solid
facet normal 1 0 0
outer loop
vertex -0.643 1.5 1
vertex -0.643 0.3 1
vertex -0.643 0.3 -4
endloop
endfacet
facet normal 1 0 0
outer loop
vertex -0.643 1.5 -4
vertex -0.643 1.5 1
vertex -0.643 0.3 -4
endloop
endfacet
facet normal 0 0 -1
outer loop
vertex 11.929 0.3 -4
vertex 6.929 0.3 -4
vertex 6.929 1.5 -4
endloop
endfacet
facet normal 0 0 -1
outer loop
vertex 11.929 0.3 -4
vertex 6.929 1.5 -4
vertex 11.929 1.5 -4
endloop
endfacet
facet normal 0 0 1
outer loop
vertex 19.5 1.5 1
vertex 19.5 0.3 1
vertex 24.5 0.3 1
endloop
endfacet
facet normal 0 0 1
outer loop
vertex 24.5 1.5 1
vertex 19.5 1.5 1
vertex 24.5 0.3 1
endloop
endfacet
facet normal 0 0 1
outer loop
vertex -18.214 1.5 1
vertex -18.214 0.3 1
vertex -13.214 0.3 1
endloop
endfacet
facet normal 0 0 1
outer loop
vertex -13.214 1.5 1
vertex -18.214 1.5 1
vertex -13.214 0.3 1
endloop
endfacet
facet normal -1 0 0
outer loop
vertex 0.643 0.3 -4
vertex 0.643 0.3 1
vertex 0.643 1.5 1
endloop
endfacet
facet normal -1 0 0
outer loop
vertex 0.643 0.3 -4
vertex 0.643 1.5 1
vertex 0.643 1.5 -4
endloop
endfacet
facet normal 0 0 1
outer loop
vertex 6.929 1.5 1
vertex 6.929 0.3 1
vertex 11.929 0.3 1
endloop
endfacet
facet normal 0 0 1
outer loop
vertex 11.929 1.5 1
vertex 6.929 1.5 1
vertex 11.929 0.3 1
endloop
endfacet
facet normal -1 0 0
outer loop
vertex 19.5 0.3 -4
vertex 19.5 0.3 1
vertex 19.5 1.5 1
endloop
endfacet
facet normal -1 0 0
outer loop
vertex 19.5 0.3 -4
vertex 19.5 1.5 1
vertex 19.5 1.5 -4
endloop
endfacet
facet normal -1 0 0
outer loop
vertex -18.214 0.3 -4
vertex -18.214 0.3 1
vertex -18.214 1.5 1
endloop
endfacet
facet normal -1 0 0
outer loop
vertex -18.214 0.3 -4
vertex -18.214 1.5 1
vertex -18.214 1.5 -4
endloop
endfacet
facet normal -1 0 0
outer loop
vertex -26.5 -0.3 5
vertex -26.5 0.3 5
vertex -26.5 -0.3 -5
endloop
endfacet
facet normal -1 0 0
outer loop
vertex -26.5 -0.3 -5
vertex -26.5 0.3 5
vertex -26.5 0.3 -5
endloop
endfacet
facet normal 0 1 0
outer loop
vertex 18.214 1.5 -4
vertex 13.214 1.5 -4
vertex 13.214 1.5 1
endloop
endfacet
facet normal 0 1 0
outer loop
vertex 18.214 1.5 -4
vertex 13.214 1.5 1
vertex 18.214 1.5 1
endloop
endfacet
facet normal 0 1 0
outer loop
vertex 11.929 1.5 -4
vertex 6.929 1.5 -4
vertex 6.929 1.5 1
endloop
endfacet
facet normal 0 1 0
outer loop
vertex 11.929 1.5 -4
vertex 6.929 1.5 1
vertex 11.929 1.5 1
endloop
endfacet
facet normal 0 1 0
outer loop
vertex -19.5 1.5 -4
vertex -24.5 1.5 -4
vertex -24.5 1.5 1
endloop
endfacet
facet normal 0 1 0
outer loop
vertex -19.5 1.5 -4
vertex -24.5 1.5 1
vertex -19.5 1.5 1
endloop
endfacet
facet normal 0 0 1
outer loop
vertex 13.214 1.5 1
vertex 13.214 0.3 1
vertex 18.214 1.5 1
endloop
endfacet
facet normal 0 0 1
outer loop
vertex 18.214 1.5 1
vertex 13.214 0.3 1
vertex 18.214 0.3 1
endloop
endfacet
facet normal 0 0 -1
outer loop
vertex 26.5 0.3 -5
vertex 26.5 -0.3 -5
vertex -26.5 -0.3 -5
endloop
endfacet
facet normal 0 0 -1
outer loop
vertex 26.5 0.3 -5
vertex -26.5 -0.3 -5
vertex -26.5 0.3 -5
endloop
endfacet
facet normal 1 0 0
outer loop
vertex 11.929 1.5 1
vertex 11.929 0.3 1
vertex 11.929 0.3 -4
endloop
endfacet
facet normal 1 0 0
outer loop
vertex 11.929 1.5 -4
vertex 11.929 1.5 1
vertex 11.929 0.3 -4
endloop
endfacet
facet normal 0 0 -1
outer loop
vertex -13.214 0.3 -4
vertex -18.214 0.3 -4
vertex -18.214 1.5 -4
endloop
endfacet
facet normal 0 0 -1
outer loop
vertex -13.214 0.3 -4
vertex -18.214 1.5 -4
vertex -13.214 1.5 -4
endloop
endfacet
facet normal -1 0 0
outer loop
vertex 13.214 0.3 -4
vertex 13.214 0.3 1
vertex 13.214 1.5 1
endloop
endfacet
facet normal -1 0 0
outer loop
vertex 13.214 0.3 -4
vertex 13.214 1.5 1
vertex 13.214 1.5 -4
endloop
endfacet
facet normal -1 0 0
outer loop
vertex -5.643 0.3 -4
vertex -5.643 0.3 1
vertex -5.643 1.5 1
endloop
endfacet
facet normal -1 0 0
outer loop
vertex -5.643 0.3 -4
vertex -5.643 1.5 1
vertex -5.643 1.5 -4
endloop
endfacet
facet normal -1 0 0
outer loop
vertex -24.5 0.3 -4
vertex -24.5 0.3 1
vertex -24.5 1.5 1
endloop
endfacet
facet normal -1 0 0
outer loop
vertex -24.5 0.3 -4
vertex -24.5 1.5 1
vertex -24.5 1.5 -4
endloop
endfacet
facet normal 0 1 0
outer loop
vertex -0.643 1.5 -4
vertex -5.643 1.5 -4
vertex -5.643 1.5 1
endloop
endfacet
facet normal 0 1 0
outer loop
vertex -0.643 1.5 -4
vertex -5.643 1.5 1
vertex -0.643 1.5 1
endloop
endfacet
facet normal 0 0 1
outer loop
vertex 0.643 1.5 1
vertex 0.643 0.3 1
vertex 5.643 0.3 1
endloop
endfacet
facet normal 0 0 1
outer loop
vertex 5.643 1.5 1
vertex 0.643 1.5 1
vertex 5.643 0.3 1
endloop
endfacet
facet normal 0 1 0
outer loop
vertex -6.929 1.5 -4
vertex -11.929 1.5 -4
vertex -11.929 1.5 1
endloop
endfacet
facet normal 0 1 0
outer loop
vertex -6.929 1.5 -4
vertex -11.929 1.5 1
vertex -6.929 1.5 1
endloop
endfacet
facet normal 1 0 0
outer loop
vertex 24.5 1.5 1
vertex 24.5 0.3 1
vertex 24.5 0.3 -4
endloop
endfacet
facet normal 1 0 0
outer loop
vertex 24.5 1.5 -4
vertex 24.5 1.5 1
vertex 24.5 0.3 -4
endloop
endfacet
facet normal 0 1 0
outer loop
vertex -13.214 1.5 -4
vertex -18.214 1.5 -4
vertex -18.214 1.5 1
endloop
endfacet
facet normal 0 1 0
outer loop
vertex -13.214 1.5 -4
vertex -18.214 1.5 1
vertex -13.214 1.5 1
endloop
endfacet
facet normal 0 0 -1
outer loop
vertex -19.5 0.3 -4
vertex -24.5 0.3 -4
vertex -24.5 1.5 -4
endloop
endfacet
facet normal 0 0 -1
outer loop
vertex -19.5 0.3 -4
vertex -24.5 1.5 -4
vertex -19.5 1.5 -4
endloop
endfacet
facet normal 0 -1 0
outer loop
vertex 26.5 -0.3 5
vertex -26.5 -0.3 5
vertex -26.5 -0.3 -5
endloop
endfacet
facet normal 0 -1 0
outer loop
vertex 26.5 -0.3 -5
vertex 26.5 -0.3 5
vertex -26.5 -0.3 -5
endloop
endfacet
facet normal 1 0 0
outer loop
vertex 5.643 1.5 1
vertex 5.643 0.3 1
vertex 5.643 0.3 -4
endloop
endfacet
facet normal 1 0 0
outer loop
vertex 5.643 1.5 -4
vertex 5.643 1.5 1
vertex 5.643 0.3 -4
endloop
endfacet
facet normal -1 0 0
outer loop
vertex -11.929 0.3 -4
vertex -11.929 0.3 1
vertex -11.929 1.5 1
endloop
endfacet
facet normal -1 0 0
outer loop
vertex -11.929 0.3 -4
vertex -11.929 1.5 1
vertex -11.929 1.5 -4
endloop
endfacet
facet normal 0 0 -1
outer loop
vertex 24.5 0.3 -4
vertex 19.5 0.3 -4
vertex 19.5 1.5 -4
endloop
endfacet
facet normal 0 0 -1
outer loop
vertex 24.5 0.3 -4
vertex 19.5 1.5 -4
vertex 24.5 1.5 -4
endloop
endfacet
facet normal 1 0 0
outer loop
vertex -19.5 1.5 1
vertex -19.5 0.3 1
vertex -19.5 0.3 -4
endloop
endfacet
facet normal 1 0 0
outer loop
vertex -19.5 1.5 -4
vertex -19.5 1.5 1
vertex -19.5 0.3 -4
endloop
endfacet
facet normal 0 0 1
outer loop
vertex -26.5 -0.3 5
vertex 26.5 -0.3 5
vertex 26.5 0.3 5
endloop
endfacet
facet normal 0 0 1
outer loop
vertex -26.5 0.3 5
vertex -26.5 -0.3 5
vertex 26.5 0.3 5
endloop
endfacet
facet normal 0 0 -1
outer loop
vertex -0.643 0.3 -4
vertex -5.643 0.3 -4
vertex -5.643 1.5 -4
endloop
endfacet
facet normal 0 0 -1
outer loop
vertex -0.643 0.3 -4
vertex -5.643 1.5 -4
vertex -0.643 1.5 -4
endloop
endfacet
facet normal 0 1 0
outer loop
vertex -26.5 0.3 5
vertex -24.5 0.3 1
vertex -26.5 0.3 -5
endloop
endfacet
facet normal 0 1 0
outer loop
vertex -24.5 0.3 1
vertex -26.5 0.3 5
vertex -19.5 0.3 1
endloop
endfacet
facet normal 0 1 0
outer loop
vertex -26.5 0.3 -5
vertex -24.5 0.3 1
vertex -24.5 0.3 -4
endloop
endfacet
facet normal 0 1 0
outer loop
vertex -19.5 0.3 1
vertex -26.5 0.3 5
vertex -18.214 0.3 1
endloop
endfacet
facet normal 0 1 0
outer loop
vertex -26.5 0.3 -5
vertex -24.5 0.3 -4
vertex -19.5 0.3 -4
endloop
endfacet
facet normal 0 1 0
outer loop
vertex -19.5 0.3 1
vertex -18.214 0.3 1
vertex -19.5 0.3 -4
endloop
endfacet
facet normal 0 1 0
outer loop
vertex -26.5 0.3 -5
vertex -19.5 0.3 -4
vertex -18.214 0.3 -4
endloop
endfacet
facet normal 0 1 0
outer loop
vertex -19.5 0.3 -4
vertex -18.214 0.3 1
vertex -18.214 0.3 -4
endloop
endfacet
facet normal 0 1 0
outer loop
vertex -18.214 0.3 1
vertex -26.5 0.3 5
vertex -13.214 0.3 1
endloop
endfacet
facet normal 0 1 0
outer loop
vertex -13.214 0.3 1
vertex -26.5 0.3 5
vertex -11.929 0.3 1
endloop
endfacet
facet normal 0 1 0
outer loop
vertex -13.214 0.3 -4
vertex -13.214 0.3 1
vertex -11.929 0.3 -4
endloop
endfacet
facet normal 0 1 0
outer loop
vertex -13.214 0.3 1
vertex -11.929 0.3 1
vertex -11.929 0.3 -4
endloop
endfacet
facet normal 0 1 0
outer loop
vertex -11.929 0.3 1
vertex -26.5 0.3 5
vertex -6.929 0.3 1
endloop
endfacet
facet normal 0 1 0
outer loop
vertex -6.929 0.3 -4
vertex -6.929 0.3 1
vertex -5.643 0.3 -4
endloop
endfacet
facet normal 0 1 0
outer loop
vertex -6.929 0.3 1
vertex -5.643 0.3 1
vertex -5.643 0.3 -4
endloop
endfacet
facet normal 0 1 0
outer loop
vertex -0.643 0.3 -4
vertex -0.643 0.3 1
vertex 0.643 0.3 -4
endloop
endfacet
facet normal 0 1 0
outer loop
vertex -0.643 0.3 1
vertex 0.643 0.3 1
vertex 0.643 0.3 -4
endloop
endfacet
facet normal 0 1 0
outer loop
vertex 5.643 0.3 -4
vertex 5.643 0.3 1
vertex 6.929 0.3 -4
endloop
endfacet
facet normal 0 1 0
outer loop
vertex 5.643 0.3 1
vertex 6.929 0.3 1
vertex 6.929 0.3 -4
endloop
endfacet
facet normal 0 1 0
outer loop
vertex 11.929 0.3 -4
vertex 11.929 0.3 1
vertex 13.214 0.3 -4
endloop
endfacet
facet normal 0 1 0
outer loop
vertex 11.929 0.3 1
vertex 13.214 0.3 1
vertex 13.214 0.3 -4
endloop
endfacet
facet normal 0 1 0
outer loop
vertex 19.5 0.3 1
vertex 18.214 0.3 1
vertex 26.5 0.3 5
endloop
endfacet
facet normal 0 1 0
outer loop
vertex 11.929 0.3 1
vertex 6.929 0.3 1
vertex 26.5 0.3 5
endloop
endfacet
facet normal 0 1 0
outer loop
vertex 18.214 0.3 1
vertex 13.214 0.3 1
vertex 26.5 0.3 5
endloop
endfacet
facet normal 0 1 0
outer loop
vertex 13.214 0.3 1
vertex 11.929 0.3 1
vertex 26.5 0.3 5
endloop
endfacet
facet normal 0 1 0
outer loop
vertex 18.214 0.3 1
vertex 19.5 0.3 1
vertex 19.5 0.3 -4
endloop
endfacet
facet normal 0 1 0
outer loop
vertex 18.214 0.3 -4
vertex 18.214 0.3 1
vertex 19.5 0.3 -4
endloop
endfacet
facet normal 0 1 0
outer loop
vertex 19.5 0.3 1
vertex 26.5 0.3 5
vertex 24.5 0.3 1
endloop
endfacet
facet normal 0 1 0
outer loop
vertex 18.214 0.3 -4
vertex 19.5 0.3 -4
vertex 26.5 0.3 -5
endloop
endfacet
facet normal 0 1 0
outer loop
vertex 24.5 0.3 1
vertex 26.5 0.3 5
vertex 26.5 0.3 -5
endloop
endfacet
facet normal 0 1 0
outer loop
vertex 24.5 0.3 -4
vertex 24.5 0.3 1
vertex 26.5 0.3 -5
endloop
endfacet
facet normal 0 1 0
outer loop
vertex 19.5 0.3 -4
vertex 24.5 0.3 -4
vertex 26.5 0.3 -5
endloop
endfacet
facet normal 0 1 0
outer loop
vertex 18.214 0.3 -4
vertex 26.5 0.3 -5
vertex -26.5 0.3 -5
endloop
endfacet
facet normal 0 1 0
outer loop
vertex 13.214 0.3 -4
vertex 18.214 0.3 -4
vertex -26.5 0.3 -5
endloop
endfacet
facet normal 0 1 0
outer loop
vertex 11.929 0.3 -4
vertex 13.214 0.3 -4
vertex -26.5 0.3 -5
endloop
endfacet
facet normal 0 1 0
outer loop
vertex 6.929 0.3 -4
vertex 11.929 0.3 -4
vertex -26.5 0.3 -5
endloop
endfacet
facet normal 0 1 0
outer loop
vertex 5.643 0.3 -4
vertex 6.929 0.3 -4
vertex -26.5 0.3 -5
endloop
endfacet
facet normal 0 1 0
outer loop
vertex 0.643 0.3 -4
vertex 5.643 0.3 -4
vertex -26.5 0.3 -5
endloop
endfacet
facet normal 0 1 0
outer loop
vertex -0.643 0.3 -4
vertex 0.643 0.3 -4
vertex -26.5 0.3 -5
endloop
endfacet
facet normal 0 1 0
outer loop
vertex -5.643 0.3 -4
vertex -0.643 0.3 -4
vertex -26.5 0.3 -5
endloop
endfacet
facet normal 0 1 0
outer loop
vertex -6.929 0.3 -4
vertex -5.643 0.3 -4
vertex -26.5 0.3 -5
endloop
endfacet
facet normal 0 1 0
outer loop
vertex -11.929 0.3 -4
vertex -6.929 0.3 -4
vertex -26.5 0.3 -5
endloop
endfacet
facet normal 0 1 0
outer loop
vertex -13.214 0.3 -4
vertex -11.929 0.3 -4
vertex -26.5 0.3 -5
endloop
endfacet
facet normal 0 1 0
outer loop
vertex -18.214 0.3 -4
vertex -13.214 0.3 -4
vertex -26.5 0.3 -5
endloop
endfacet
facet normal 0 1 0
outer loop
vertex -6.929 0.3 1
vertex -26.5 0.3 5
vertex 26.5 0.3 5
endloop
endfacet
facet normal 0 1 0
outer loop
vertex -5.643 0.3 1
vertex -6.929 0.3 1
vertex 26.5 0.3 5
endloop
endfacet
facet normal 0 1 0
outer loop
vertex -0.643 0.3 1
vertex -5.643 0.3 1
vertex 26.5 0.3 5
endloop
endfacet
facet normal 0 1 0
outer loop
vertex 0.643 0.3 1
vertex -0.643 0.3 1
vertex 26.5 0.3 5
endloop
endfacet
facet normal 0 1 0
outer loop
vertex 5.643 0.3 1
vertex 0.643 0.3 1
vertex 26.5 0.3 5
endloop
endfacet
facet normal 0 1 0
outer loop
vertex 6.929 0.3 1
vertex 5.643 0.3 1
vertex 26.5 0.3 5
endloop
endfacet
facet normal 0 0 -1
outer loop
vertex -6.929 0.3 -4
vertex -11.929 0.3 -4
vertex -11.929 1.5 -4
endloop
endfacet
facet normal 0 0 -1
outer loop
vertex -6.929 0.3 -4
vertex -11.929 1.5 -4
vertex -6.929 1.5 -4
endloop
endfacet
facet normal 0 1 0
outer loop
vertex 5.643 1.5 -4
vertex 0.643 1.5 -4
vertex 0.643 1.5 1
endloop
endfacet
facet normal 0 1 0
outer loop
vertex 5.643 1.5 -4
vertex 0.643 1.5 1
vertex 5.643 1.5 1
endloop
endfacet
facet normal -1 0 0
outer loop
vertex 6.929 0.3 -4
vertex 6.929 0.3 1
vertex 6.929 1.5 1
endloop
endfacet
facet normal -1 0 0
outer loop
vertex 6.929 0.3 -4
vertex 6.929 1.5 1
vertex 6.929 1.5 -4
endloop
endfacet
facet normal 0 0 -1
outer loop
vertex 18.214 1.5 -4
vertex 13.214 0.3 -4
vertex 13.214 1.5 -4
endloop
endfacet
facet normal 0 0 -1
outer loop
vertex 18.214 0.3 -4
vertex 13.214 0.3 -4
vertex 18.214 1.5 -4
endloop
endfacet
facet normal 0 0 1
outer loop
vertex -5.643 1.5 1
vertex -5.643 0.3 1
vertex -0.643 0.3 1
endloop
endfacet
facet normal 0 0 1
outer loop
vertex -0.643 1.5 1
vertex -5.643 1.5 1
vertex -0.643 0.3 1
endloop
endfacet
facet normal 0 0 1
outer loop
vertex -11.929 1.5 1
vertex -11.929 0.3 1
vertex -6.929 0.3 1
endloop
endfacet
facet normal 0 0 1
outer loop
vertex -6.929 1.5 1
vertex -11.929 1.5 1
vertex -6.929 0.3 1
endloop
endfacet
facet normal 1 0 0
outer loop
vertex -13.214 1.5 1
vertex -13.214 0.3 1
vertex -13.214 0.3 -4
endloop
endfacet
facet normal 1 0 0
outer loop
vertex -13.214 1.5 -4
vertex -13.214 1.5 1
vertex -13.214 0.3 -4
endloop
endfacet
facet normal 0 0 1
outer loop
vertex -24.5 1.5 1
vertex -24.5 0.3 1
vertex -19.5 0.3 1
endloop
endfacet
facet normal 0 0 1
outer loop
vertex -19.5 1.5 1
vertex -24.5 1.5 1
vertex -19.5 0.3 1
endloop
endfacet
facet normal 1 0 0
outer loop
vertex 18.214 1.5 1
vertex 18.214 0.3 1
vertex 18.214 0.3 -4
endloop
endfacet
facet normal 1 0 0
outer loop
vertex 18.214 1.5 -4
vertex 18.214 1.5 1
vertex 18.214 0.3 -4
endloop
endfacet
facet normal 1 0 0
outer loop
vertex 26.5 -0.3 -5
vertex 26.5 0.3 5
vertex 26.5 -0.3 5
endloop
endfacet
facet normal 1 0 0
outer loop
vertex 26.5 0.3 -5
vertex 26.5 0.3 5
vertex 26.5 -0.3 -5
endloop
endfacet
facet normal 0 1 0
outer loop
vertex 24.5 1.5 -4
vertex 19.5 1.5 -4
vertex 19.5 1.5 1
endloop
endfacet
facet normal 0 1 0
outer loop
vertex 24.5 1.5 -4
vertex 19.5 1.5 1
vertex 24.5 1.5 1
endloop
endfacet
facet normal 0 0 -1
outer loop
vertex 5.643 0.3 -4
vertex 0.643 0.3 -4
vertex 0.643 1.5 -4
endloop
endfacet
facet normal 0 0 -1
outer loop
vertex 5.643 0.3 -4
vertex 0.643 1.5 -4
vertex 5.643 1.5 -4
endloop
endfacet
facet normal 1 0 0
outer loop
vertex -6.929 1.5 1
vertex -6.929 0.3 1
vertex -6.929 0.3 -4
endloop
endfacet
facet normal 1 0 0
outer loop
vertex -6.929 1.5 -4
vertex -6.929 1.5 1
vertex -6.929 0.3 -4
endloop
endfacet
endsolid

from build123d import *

# Parameters (mm, degrees)
SKETCH1_W           = 10
SKETCH1_H           = 0.6
BOSS_EXTRUDE1_DEPTH = 26.5
SKETCH2_W           = 5
SKETCH2_H           = 5
BOSS_EXTRUDE2_DEPTH = 1.2


with BuildPart() as part:
    # Sketch1 → Boss-Extrude1 (new, symmetric)
    with BuildSketch(Plane(origin=(0, 0, 0), x_dir=(0, 0, -1), z_dir=(1, 0, 0))):
        Rectangle(SKETCH1_W, SKETCH1_H)
    extrude(amount=BOSS_EXTRUDE1_DEPTH, both=True)

    # Sketch2 → Boss-Extrude2 (add)
    with BuildSketch(Plane(origin=(0, 0.3, 0), x_dir=(1, 0, 0), z_dir=(0, 1, 0))):
        with Locations((-15.714285714, 1.5)):
            Rectangle(SKETCH2_W, SKETCH2_H)
        with Locations((-22, 1.5)):
            Rectangle(SKETCH2_W, SKETCH2_H)
        with Locations((-9.428571429, 1.5)):
            Rectangle(SKETCH2_W, SKETCH2_H)
        with Locations((-3.142857143, 1.5)):
            Rectangle(SKETCH2_W, SKETCH2_H)
        with Locations((3.142857143, 1.5)):
            Rectangle(SKETCH2_W, SKETCH2_H)
        with Locations((9.428571429, 1.5)):
            Rectangle(SKETCH2_W, SKETCH2_H)
        with Locations((15.714285714, 1.5)):
            Rectangle(SKETCH2_W, SKETCH2_H)
        with Locations((22, 1.5)):
            Rectangle(SKETCH2_W, SKETCH2_H)
    extrude(amount=BOSS_EXTRUDE2_DEPTH)


solid = part.part
